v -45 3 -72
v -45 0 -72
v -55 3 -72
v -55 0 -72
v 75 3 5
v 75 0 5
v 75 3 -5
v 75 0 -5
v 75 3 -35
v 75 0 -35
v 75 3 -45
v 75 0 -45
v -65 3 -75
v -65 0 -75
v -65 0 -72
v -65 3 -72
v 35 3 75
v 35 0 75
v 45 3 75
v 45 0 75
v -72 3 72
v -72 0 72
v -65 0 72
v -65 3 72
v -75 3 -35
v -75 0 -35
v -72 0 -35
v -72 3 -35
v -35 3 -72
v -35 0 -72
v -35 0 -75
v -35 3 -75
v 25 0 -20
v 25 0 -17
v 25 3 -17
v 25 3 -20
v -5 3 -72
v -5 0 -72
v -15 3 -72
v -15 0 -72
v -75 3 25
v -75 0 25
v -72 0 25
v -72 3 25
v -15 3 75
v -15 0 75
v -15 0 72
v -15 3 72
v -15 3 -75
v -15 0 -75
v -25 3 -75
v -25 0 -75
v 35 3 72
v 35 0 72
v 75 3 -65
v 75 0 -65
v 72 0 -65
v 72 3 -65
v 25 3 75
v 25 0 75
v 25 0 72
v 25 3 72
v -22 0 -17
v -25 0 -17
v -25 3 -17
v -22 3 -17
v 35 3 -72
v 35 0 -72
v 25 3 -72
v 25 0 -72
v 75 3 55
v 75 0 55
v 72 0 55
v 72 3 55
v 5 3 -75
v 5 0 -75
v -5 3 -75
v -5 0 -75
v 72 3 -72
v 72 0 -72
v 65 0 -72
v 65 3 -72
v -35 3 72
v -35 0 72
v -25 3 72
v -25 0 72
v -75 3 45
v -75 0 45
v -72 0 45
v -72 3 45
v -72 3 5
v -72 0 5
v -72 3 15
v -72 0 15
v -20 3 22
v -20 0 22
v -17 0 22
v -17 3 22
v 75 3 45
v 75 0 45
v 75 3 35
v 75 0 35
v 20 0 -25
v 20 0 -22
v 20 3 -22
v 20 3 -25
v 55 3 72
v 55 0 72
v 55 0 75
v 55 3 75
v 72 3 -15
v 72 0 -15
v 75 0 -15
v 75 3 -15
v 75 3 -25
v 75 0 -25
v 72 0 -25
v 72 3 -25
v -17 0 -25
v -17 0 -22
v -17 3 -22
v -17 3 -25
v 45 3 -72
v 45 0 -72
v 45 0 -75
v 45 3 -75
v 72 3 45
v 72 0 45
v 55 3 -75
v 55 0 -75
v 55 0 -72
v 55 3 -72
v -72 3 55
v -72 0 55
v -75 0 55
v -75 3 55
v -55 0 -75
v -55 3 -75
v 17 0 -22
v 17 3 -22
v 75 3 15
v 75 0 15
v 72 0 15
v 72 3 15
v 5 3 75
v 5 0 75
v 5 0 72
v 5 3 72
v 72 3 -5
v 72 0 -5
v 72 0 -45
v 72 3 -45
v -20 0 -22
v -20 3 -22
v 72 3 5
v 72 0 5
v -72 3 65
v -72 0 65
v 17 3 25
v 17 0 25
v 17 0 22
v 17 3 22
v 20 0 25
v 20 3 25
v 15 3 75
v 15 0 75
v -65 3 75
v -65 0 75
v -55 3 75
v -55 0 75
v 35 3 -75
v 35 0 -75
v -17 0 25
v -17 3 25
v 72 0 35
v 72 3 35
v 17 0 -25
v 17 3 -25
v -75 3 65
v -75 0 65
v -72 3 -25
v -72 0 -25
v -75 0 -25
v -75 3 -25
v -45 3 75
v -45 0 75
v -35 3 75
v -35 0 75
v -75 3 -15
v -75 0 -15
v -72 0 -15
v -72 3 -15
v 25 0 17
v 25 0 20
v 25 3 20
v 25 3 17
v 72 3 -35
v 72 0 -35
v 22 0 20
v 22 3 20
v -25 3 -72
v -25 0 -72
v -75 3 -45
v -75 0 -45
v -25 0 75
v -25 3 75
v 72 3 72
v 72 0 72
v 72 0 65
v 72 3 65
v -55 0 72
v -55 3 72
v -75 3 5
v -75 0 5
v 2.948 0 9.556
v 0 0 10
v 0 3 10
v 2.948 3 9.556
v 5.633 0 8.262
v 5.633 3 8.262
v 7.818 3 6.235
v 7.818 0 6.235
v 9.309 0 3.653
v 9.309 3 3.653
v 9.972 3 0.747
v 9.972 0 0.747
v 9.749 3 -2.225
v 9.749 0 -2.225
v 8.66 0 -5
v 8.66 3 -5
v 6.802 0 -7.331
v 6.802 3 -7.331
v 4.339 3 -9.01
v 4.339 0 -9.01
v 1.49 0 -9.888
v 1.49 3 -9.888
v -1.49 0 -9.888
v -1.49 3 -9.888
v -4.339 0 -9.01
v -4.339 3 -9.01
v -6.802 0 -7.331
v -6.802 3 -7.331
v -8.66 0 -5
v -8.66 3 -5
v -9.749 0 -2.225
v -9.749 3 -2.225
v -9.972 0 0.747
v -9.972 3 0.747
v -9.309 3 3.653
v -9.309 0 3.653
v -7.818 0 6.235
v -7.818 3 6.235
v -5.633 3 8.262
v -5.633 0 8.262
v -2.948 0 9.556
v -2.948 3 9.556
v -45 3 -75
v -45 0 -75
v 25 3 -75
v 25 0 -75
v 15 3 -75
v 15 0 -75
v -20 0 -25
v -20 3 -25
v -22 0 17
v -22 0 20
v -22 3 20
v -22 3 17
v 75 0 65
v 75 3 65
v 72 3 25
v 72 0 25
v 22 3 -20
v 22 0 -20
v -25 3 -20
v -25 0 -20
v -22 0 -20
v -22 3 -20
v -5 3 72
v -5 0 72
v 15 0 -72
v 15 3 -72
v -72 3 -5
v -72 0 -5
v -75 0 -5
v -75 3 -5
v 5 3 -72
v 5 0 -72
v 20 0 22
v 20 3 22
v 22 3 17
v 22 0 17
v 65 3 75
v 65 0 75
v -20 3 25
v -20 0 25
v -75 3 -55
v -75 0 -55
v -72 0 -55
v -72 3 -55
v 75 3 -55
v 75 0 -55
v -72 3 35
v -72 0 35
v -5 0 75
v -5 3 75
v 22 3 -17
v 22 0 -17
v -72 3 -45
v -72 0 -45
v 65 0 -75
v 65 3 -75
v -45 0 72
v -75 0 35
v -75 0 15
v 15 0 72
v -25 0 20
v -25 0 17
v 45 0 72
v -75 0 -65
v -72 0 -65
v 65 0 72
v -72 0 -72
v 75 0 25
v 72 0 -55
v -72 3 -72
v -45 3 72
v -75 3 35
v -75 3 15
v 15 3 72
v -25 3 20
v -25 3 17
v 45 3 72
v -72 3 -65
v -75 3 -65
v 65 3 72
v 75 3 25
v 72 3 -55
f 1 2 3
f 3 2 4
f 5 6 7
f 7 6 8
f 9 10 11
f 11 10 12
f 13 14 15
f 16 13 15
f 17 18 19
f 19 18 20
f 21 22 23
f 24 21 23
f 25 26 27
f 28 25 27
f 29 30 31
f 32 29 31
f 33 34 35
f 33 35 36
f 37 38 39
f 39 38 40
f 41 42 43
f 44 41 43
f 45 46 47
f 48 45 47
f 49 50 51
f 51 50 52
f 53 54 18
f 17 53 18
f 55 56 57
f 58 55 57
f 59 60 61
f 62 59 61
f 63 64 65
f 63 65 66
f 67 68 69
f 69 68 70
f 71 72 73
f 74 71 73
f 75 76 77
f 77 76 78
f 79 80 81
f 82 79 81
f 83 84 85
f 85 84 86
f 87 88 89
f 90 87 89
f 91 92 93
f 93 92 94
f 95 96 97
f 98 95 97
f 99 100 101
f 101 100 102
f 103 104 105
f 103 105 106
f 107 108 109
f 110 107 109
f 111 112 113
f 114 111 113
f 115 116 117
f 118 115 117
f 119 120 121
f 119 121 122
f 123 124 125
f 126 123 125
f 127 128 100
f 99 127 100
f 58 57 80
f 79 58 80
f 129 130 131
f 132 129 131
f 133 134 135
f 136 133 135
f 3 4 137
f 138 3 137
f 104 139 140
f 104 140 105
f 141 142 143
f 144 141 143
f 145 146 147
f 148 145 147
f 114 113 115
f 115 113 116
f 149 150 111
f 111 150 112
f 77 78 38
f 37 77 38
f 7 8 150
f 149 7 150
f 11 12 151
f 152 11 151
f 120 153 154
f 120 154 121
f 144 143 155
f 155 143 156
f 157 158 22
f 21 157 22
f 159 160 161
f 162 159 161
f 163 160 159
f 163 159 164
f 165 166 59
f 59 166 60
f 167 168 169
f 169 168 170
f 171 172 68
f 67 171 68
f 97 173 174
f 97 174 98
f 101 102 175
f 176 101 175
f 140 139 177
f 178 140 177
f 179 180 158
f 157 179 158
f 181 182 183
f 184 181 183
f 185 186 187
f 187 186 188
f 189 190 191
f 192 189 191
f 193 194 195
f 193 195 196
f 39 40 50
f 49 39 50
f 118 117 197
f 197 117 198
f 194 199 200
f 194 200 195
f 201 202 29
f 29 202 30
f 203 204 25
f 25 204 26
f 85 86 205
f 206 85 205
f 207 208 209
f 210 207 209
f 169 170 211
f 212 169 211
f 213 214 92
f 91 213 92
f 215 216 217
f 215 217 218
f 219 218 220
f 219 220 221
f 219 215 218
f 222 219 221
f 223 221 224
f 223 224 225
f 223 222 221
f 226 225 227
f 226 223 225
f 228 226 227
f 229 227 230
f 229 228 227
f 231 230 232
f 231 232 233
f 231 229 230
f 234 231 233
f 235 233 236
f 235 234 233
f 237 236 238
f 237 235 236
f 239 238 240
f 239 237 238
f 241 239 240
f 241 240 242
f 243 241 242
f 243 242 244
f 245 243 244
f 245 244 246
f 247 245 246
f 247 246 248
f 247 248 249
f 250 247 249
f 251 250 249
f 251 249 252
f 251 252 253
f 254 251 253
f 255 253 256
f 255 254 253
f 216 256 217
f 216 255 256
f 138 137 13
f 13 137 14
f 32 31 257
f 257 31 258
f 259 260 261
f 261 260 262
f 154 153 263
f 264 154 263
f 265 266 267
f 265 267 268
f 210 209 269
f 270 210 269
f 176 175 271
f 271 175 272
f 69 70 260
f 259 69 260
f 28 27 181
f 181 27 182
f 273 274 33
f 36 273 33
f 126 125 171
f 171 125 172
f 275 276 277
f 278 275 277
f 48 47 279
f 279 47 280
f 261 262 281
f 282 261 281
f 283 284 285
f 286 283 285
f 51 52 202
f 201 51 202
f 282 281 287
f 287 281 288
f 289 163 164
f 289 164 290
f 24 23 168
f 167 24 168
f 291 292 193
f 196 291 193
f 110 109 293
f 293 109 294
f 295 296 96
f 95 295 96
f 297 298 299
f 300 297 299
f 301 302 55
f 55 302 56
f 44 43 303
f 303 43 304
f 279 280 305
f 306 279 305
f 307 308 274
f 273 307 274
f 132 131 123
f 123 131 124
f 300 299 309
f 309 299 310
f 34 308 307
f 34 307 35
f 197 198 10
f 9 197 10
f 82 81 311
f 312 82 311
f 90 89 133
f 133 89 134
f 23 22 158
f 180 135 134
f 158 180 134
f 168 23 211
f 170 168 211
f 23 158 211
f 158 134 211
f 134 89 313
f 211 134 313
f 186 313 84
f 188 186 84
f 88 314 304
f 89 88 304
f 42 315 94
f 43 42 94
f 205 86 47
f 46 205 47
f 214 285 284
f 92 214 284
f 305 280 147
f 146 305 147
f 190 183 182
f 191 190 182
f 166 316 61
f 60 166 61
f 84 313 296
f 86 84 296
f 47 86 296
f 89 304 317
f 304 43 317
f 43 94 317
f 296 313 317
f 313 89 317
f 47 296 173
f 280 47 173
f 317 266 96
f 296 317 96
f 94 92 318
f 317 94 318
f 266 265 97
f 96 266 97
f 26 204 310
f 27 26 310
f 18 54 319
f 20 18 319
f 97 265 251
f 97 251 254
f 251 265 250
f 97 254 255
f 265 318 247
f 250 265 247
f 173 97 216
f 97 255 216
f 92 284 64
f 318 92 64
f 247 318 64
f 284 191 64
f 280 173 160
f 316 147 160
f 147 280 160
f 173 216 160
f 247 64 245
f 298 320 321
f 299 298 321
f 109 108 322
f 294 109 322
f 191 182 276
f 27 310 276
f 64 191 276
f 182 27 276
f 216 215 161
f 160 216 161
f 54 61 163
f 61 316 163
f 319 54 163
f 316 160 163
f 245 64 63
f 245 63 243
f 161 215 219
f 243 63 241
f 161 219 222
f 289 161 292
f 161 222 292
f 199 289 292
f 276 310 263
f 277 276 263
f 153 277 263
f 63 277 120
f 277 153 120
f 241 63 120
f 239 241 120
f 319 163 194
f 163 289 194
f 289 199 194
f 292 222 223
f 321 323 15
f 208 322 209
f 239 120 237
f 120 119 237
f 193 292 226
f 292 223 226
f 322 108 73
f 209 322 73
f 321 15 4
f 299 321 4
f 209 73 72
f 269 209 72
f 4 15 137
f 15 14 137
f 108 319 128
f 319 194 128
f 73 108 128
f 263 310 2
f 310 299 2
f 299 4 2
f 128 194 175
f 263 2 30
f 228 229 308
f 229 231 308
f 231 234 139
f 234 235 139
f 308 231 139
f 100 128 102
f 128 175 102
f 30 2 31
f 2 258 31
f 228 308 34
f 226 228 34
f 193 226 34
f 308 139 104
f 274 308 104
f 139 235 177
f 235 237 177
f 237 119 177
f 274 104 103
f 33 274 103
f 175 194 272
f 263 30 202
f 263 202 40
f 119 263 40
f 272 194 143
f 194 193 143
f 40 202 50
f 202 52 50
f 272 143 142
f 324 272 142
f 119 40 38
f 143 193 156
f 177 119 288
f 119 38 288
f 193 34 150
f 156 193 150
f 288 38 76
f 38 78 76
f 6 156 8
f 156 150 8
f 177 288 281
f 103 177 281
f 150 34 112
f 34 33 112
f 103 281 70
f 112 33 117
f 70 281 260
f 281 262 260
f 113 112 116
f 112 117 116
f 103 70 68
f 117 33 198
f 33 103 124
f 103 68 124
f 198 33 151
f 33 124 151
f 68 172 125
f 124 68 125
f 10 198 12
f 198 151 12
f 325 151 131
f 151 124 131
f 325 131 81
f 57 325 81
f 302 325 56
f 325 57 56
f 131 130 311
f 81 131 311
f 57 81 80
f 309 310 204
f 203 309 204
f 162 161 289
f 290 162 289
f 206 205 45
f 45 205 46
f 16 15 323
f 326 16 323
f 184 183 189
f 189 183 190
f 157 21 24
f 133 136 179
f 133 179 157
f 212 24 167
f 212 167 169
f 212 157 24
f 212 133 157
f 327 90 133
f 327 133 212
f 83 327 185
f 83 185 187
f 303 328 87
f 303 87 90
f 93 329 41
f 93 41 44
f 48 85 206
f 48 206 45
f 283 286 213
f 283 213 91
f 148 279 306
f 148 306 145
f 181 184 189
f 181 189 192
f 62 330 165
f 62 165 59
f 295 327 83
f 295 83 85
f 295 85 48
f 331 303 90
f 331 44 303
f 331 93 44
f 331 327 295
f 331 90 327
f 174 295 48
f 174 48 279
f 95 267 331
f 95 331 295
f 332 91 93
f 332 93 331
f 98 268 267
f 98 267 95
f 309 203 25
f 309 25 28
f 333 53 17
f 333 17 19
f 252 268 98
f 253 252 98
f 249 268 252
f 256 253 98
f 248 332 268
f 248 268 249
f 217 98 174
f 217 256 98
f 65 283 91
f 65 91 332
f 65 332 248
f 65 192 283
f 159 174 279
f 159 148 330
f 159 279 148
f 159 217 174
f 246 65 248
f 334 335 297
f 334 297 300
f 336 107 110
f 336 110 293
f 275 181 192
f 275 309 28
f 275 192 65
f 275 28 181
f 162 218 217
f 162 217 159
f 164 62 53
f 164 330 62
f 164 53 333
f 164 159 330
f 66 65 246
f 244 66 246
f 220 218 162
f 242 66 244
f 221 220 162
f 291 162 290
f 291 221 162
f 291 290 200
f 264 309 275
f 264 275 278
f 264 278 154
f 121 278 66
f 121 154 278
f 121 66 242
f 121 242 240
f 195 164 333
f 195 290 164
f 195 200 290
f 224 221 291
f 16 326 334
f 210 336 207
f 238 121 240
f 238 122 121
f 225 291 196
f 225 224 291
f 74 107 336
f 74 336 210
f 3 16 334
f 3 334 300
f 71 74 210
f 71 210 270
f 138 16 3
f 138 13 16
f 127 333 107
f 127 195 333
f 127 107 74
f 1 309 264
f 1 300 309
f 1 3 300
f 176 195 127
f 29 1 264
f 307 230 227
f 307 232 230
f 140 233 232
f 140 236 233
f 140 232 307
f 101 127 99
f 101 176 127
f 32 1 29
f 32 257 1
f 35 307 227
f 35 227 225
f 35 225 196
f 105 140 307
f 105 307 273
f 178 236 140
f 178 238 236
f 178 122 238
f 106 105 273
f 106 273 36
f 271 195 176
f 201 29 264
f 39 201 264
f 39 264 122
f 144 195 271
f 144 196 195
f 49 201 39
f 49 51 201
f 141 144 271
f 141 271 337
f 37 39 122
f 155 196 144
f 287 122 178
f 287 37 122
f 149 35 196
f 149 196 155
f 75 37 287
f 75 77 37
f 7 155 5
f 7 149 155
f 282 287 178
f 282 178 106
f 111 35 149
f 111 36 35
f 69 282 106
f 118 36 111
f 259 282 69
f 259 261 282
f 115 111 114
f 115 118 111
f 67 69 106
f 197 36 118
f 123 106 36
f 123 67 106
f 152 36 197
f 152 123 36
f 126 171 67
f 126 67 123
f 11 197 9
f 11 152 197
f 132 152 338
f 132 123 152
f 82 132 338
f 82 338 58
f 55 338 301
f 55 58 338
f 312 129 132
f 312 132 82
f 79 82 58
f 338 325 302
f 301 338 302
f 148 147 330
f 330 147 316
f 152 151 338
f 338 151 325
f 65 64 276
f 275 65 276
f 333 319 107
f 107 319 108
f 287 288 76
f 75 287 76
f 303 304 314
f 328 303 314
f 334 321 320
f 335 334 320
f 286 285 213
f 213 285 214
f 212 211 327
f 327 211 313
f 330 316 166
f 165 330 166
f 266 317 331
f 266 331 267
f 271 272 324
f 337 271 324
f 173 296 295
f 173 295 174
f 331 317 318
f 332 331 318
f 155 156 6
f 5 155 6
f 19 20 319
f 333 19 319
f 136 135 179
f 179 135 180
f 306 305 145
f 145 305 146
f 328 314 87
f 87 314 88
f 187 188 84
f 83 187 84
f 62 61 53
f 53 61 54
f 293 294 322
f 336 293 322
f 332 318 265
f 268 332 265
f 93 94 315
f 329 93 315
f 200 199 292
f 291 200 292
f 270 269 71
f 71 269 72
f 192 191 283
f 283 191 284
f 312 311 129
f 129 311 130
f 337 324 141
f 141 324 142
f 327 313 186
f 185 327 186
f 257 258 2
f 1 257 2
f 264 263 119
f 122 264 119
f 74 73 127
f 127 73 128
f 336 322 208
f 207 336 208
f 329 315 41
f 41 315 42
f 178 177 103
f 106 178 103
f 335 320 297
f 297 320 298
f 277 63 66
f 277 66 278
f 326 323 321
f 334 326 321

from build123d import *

# Parameters (mm, degrees)
CROQUIS1_R              = 10
CROQUIS1_W              = 3
CROQUIS1_H              = 3
SALIENTE_EXTRUIR2_DEPTH = 3


with BuildPart() as part:
    # Croquis1 → Saliente-Extruir2 (new body)
    with BuildSketch(Plane(origin=(0, 0, 0), x_dir=(1, 0, 0), z_dir=(0, 1, 0))):
        Polygon((-72, -72), (-65, -72), (-65, -75), (-55, -75), (-55, -72), (-45, -72), (-45, -75), (-35, -75), (-35, -72), (-25, -72), (-25, -75), (-15, -75), (-15, -72), (-5, -72), (-5, -75), (5, -75), (5, -72), (15, -72), (15, -75), (25, -75), (25, -72), (35, -72), (35, -75), (45, -75), (45, -72), (55, -72), (55, -75), (65, -75), (65, -72), (72, -72), (72, -65), (75, -65), (75, -55), (72, -55), (72, -45), (75, -45), (75, -35), (72, -35), (72, -25), (75, -25), (75, -15), (72, -15), (72, -5), (75, -5), (75, 5), (72, 5), (72, 15), (75, 15), (75, 25), (72, 25), (72, 35), (75, 35), (75, 45), (72, 45), (72, 55), (75, 55), (75, 65), (72, 65), (72, 72), (65, 72), (65, 75), (55, 75), (55, 72), (45, 72), (45, 75), (35, 75), (35, 72), (25, 72), (25, 75), (15, 75), (15, 72), (5, 72), (5, 75), (-5, 75), (-5, 72), (-15, 72), (-15, 75), (-25, 75), (-25, 72), (-35, 72), (-35, 75), (-45, 75), (-45, 72), (-55, 72), (-55, 75), (-65, 75), (-65, 72), (-72, 72), (-72, 65), (-75, 65), (-75, 55), (-72, 55), (-72, 45), (-75, 45), (-75, 35), (-72, 35), (-72, 25), (-75, 25), (-75, 15), (-72, 15), (-72, 5), (-75, 5), (-75, -5), (-72, -5), (-72, -15), (-75, -15), (-75, -25), (-72, -25), (-72, -35), (-75, -35), (-75, -45), (-72, -45), (-72, -55), (-75, -55), (-75, -65), (-72, -65), align=None)
        with Locations(Location((0, 0, 0), (0, 0, 270))):
            Circle(CROQUIS1_R, mode=Mode.SUBTRACT)
        with Locations((18.5, 23.5)):
            Rectangle(CROQUIS1_W, CROQUIS1_H, mode=Mode.SUBTRACT)
        with Locations((-18.5, 23.5)):
            Rectangle(CROQUIS1_W, CROQUIS1_H, mode=Mode.SUBTRACT)
        with Locations((-23.5, 18.5)):
            Rectangle(CROQUIS1_W, CROQUIS1_H, mode=Mode.SUBTRACT)
        with Locations((-23.5, -18.5)):
            Rectangle(CROQUIS1_W, CROQUIS1_H, mode=Mode.SUBTRACT)
        with Locations((23.5, -18.5)):
            Rectangle(CROQUIS1_W, CROQUIS1_H, mode=Mode.SUBTRACT)
        with Locations((23.5, 18.5)):
            Rectangle(CROQUIS1_W, CROQUIS1_H, mode=Mode.SUBTRACT)
        with Locations((18.5, -23.5)):
            Rectangle(CROQUIS1_W, CROQUIS1_H, mode=Mode.SUBTRACT)
        with Locations((-18.5, -23.5)):
            Rectangle(CROQUIS1_W, CROQUIS1_H, mode=Mode.SUBTRACT)
    extrude(amount=SALIENTE_EXTRUIR2_DEPTH)


solid = part.part
